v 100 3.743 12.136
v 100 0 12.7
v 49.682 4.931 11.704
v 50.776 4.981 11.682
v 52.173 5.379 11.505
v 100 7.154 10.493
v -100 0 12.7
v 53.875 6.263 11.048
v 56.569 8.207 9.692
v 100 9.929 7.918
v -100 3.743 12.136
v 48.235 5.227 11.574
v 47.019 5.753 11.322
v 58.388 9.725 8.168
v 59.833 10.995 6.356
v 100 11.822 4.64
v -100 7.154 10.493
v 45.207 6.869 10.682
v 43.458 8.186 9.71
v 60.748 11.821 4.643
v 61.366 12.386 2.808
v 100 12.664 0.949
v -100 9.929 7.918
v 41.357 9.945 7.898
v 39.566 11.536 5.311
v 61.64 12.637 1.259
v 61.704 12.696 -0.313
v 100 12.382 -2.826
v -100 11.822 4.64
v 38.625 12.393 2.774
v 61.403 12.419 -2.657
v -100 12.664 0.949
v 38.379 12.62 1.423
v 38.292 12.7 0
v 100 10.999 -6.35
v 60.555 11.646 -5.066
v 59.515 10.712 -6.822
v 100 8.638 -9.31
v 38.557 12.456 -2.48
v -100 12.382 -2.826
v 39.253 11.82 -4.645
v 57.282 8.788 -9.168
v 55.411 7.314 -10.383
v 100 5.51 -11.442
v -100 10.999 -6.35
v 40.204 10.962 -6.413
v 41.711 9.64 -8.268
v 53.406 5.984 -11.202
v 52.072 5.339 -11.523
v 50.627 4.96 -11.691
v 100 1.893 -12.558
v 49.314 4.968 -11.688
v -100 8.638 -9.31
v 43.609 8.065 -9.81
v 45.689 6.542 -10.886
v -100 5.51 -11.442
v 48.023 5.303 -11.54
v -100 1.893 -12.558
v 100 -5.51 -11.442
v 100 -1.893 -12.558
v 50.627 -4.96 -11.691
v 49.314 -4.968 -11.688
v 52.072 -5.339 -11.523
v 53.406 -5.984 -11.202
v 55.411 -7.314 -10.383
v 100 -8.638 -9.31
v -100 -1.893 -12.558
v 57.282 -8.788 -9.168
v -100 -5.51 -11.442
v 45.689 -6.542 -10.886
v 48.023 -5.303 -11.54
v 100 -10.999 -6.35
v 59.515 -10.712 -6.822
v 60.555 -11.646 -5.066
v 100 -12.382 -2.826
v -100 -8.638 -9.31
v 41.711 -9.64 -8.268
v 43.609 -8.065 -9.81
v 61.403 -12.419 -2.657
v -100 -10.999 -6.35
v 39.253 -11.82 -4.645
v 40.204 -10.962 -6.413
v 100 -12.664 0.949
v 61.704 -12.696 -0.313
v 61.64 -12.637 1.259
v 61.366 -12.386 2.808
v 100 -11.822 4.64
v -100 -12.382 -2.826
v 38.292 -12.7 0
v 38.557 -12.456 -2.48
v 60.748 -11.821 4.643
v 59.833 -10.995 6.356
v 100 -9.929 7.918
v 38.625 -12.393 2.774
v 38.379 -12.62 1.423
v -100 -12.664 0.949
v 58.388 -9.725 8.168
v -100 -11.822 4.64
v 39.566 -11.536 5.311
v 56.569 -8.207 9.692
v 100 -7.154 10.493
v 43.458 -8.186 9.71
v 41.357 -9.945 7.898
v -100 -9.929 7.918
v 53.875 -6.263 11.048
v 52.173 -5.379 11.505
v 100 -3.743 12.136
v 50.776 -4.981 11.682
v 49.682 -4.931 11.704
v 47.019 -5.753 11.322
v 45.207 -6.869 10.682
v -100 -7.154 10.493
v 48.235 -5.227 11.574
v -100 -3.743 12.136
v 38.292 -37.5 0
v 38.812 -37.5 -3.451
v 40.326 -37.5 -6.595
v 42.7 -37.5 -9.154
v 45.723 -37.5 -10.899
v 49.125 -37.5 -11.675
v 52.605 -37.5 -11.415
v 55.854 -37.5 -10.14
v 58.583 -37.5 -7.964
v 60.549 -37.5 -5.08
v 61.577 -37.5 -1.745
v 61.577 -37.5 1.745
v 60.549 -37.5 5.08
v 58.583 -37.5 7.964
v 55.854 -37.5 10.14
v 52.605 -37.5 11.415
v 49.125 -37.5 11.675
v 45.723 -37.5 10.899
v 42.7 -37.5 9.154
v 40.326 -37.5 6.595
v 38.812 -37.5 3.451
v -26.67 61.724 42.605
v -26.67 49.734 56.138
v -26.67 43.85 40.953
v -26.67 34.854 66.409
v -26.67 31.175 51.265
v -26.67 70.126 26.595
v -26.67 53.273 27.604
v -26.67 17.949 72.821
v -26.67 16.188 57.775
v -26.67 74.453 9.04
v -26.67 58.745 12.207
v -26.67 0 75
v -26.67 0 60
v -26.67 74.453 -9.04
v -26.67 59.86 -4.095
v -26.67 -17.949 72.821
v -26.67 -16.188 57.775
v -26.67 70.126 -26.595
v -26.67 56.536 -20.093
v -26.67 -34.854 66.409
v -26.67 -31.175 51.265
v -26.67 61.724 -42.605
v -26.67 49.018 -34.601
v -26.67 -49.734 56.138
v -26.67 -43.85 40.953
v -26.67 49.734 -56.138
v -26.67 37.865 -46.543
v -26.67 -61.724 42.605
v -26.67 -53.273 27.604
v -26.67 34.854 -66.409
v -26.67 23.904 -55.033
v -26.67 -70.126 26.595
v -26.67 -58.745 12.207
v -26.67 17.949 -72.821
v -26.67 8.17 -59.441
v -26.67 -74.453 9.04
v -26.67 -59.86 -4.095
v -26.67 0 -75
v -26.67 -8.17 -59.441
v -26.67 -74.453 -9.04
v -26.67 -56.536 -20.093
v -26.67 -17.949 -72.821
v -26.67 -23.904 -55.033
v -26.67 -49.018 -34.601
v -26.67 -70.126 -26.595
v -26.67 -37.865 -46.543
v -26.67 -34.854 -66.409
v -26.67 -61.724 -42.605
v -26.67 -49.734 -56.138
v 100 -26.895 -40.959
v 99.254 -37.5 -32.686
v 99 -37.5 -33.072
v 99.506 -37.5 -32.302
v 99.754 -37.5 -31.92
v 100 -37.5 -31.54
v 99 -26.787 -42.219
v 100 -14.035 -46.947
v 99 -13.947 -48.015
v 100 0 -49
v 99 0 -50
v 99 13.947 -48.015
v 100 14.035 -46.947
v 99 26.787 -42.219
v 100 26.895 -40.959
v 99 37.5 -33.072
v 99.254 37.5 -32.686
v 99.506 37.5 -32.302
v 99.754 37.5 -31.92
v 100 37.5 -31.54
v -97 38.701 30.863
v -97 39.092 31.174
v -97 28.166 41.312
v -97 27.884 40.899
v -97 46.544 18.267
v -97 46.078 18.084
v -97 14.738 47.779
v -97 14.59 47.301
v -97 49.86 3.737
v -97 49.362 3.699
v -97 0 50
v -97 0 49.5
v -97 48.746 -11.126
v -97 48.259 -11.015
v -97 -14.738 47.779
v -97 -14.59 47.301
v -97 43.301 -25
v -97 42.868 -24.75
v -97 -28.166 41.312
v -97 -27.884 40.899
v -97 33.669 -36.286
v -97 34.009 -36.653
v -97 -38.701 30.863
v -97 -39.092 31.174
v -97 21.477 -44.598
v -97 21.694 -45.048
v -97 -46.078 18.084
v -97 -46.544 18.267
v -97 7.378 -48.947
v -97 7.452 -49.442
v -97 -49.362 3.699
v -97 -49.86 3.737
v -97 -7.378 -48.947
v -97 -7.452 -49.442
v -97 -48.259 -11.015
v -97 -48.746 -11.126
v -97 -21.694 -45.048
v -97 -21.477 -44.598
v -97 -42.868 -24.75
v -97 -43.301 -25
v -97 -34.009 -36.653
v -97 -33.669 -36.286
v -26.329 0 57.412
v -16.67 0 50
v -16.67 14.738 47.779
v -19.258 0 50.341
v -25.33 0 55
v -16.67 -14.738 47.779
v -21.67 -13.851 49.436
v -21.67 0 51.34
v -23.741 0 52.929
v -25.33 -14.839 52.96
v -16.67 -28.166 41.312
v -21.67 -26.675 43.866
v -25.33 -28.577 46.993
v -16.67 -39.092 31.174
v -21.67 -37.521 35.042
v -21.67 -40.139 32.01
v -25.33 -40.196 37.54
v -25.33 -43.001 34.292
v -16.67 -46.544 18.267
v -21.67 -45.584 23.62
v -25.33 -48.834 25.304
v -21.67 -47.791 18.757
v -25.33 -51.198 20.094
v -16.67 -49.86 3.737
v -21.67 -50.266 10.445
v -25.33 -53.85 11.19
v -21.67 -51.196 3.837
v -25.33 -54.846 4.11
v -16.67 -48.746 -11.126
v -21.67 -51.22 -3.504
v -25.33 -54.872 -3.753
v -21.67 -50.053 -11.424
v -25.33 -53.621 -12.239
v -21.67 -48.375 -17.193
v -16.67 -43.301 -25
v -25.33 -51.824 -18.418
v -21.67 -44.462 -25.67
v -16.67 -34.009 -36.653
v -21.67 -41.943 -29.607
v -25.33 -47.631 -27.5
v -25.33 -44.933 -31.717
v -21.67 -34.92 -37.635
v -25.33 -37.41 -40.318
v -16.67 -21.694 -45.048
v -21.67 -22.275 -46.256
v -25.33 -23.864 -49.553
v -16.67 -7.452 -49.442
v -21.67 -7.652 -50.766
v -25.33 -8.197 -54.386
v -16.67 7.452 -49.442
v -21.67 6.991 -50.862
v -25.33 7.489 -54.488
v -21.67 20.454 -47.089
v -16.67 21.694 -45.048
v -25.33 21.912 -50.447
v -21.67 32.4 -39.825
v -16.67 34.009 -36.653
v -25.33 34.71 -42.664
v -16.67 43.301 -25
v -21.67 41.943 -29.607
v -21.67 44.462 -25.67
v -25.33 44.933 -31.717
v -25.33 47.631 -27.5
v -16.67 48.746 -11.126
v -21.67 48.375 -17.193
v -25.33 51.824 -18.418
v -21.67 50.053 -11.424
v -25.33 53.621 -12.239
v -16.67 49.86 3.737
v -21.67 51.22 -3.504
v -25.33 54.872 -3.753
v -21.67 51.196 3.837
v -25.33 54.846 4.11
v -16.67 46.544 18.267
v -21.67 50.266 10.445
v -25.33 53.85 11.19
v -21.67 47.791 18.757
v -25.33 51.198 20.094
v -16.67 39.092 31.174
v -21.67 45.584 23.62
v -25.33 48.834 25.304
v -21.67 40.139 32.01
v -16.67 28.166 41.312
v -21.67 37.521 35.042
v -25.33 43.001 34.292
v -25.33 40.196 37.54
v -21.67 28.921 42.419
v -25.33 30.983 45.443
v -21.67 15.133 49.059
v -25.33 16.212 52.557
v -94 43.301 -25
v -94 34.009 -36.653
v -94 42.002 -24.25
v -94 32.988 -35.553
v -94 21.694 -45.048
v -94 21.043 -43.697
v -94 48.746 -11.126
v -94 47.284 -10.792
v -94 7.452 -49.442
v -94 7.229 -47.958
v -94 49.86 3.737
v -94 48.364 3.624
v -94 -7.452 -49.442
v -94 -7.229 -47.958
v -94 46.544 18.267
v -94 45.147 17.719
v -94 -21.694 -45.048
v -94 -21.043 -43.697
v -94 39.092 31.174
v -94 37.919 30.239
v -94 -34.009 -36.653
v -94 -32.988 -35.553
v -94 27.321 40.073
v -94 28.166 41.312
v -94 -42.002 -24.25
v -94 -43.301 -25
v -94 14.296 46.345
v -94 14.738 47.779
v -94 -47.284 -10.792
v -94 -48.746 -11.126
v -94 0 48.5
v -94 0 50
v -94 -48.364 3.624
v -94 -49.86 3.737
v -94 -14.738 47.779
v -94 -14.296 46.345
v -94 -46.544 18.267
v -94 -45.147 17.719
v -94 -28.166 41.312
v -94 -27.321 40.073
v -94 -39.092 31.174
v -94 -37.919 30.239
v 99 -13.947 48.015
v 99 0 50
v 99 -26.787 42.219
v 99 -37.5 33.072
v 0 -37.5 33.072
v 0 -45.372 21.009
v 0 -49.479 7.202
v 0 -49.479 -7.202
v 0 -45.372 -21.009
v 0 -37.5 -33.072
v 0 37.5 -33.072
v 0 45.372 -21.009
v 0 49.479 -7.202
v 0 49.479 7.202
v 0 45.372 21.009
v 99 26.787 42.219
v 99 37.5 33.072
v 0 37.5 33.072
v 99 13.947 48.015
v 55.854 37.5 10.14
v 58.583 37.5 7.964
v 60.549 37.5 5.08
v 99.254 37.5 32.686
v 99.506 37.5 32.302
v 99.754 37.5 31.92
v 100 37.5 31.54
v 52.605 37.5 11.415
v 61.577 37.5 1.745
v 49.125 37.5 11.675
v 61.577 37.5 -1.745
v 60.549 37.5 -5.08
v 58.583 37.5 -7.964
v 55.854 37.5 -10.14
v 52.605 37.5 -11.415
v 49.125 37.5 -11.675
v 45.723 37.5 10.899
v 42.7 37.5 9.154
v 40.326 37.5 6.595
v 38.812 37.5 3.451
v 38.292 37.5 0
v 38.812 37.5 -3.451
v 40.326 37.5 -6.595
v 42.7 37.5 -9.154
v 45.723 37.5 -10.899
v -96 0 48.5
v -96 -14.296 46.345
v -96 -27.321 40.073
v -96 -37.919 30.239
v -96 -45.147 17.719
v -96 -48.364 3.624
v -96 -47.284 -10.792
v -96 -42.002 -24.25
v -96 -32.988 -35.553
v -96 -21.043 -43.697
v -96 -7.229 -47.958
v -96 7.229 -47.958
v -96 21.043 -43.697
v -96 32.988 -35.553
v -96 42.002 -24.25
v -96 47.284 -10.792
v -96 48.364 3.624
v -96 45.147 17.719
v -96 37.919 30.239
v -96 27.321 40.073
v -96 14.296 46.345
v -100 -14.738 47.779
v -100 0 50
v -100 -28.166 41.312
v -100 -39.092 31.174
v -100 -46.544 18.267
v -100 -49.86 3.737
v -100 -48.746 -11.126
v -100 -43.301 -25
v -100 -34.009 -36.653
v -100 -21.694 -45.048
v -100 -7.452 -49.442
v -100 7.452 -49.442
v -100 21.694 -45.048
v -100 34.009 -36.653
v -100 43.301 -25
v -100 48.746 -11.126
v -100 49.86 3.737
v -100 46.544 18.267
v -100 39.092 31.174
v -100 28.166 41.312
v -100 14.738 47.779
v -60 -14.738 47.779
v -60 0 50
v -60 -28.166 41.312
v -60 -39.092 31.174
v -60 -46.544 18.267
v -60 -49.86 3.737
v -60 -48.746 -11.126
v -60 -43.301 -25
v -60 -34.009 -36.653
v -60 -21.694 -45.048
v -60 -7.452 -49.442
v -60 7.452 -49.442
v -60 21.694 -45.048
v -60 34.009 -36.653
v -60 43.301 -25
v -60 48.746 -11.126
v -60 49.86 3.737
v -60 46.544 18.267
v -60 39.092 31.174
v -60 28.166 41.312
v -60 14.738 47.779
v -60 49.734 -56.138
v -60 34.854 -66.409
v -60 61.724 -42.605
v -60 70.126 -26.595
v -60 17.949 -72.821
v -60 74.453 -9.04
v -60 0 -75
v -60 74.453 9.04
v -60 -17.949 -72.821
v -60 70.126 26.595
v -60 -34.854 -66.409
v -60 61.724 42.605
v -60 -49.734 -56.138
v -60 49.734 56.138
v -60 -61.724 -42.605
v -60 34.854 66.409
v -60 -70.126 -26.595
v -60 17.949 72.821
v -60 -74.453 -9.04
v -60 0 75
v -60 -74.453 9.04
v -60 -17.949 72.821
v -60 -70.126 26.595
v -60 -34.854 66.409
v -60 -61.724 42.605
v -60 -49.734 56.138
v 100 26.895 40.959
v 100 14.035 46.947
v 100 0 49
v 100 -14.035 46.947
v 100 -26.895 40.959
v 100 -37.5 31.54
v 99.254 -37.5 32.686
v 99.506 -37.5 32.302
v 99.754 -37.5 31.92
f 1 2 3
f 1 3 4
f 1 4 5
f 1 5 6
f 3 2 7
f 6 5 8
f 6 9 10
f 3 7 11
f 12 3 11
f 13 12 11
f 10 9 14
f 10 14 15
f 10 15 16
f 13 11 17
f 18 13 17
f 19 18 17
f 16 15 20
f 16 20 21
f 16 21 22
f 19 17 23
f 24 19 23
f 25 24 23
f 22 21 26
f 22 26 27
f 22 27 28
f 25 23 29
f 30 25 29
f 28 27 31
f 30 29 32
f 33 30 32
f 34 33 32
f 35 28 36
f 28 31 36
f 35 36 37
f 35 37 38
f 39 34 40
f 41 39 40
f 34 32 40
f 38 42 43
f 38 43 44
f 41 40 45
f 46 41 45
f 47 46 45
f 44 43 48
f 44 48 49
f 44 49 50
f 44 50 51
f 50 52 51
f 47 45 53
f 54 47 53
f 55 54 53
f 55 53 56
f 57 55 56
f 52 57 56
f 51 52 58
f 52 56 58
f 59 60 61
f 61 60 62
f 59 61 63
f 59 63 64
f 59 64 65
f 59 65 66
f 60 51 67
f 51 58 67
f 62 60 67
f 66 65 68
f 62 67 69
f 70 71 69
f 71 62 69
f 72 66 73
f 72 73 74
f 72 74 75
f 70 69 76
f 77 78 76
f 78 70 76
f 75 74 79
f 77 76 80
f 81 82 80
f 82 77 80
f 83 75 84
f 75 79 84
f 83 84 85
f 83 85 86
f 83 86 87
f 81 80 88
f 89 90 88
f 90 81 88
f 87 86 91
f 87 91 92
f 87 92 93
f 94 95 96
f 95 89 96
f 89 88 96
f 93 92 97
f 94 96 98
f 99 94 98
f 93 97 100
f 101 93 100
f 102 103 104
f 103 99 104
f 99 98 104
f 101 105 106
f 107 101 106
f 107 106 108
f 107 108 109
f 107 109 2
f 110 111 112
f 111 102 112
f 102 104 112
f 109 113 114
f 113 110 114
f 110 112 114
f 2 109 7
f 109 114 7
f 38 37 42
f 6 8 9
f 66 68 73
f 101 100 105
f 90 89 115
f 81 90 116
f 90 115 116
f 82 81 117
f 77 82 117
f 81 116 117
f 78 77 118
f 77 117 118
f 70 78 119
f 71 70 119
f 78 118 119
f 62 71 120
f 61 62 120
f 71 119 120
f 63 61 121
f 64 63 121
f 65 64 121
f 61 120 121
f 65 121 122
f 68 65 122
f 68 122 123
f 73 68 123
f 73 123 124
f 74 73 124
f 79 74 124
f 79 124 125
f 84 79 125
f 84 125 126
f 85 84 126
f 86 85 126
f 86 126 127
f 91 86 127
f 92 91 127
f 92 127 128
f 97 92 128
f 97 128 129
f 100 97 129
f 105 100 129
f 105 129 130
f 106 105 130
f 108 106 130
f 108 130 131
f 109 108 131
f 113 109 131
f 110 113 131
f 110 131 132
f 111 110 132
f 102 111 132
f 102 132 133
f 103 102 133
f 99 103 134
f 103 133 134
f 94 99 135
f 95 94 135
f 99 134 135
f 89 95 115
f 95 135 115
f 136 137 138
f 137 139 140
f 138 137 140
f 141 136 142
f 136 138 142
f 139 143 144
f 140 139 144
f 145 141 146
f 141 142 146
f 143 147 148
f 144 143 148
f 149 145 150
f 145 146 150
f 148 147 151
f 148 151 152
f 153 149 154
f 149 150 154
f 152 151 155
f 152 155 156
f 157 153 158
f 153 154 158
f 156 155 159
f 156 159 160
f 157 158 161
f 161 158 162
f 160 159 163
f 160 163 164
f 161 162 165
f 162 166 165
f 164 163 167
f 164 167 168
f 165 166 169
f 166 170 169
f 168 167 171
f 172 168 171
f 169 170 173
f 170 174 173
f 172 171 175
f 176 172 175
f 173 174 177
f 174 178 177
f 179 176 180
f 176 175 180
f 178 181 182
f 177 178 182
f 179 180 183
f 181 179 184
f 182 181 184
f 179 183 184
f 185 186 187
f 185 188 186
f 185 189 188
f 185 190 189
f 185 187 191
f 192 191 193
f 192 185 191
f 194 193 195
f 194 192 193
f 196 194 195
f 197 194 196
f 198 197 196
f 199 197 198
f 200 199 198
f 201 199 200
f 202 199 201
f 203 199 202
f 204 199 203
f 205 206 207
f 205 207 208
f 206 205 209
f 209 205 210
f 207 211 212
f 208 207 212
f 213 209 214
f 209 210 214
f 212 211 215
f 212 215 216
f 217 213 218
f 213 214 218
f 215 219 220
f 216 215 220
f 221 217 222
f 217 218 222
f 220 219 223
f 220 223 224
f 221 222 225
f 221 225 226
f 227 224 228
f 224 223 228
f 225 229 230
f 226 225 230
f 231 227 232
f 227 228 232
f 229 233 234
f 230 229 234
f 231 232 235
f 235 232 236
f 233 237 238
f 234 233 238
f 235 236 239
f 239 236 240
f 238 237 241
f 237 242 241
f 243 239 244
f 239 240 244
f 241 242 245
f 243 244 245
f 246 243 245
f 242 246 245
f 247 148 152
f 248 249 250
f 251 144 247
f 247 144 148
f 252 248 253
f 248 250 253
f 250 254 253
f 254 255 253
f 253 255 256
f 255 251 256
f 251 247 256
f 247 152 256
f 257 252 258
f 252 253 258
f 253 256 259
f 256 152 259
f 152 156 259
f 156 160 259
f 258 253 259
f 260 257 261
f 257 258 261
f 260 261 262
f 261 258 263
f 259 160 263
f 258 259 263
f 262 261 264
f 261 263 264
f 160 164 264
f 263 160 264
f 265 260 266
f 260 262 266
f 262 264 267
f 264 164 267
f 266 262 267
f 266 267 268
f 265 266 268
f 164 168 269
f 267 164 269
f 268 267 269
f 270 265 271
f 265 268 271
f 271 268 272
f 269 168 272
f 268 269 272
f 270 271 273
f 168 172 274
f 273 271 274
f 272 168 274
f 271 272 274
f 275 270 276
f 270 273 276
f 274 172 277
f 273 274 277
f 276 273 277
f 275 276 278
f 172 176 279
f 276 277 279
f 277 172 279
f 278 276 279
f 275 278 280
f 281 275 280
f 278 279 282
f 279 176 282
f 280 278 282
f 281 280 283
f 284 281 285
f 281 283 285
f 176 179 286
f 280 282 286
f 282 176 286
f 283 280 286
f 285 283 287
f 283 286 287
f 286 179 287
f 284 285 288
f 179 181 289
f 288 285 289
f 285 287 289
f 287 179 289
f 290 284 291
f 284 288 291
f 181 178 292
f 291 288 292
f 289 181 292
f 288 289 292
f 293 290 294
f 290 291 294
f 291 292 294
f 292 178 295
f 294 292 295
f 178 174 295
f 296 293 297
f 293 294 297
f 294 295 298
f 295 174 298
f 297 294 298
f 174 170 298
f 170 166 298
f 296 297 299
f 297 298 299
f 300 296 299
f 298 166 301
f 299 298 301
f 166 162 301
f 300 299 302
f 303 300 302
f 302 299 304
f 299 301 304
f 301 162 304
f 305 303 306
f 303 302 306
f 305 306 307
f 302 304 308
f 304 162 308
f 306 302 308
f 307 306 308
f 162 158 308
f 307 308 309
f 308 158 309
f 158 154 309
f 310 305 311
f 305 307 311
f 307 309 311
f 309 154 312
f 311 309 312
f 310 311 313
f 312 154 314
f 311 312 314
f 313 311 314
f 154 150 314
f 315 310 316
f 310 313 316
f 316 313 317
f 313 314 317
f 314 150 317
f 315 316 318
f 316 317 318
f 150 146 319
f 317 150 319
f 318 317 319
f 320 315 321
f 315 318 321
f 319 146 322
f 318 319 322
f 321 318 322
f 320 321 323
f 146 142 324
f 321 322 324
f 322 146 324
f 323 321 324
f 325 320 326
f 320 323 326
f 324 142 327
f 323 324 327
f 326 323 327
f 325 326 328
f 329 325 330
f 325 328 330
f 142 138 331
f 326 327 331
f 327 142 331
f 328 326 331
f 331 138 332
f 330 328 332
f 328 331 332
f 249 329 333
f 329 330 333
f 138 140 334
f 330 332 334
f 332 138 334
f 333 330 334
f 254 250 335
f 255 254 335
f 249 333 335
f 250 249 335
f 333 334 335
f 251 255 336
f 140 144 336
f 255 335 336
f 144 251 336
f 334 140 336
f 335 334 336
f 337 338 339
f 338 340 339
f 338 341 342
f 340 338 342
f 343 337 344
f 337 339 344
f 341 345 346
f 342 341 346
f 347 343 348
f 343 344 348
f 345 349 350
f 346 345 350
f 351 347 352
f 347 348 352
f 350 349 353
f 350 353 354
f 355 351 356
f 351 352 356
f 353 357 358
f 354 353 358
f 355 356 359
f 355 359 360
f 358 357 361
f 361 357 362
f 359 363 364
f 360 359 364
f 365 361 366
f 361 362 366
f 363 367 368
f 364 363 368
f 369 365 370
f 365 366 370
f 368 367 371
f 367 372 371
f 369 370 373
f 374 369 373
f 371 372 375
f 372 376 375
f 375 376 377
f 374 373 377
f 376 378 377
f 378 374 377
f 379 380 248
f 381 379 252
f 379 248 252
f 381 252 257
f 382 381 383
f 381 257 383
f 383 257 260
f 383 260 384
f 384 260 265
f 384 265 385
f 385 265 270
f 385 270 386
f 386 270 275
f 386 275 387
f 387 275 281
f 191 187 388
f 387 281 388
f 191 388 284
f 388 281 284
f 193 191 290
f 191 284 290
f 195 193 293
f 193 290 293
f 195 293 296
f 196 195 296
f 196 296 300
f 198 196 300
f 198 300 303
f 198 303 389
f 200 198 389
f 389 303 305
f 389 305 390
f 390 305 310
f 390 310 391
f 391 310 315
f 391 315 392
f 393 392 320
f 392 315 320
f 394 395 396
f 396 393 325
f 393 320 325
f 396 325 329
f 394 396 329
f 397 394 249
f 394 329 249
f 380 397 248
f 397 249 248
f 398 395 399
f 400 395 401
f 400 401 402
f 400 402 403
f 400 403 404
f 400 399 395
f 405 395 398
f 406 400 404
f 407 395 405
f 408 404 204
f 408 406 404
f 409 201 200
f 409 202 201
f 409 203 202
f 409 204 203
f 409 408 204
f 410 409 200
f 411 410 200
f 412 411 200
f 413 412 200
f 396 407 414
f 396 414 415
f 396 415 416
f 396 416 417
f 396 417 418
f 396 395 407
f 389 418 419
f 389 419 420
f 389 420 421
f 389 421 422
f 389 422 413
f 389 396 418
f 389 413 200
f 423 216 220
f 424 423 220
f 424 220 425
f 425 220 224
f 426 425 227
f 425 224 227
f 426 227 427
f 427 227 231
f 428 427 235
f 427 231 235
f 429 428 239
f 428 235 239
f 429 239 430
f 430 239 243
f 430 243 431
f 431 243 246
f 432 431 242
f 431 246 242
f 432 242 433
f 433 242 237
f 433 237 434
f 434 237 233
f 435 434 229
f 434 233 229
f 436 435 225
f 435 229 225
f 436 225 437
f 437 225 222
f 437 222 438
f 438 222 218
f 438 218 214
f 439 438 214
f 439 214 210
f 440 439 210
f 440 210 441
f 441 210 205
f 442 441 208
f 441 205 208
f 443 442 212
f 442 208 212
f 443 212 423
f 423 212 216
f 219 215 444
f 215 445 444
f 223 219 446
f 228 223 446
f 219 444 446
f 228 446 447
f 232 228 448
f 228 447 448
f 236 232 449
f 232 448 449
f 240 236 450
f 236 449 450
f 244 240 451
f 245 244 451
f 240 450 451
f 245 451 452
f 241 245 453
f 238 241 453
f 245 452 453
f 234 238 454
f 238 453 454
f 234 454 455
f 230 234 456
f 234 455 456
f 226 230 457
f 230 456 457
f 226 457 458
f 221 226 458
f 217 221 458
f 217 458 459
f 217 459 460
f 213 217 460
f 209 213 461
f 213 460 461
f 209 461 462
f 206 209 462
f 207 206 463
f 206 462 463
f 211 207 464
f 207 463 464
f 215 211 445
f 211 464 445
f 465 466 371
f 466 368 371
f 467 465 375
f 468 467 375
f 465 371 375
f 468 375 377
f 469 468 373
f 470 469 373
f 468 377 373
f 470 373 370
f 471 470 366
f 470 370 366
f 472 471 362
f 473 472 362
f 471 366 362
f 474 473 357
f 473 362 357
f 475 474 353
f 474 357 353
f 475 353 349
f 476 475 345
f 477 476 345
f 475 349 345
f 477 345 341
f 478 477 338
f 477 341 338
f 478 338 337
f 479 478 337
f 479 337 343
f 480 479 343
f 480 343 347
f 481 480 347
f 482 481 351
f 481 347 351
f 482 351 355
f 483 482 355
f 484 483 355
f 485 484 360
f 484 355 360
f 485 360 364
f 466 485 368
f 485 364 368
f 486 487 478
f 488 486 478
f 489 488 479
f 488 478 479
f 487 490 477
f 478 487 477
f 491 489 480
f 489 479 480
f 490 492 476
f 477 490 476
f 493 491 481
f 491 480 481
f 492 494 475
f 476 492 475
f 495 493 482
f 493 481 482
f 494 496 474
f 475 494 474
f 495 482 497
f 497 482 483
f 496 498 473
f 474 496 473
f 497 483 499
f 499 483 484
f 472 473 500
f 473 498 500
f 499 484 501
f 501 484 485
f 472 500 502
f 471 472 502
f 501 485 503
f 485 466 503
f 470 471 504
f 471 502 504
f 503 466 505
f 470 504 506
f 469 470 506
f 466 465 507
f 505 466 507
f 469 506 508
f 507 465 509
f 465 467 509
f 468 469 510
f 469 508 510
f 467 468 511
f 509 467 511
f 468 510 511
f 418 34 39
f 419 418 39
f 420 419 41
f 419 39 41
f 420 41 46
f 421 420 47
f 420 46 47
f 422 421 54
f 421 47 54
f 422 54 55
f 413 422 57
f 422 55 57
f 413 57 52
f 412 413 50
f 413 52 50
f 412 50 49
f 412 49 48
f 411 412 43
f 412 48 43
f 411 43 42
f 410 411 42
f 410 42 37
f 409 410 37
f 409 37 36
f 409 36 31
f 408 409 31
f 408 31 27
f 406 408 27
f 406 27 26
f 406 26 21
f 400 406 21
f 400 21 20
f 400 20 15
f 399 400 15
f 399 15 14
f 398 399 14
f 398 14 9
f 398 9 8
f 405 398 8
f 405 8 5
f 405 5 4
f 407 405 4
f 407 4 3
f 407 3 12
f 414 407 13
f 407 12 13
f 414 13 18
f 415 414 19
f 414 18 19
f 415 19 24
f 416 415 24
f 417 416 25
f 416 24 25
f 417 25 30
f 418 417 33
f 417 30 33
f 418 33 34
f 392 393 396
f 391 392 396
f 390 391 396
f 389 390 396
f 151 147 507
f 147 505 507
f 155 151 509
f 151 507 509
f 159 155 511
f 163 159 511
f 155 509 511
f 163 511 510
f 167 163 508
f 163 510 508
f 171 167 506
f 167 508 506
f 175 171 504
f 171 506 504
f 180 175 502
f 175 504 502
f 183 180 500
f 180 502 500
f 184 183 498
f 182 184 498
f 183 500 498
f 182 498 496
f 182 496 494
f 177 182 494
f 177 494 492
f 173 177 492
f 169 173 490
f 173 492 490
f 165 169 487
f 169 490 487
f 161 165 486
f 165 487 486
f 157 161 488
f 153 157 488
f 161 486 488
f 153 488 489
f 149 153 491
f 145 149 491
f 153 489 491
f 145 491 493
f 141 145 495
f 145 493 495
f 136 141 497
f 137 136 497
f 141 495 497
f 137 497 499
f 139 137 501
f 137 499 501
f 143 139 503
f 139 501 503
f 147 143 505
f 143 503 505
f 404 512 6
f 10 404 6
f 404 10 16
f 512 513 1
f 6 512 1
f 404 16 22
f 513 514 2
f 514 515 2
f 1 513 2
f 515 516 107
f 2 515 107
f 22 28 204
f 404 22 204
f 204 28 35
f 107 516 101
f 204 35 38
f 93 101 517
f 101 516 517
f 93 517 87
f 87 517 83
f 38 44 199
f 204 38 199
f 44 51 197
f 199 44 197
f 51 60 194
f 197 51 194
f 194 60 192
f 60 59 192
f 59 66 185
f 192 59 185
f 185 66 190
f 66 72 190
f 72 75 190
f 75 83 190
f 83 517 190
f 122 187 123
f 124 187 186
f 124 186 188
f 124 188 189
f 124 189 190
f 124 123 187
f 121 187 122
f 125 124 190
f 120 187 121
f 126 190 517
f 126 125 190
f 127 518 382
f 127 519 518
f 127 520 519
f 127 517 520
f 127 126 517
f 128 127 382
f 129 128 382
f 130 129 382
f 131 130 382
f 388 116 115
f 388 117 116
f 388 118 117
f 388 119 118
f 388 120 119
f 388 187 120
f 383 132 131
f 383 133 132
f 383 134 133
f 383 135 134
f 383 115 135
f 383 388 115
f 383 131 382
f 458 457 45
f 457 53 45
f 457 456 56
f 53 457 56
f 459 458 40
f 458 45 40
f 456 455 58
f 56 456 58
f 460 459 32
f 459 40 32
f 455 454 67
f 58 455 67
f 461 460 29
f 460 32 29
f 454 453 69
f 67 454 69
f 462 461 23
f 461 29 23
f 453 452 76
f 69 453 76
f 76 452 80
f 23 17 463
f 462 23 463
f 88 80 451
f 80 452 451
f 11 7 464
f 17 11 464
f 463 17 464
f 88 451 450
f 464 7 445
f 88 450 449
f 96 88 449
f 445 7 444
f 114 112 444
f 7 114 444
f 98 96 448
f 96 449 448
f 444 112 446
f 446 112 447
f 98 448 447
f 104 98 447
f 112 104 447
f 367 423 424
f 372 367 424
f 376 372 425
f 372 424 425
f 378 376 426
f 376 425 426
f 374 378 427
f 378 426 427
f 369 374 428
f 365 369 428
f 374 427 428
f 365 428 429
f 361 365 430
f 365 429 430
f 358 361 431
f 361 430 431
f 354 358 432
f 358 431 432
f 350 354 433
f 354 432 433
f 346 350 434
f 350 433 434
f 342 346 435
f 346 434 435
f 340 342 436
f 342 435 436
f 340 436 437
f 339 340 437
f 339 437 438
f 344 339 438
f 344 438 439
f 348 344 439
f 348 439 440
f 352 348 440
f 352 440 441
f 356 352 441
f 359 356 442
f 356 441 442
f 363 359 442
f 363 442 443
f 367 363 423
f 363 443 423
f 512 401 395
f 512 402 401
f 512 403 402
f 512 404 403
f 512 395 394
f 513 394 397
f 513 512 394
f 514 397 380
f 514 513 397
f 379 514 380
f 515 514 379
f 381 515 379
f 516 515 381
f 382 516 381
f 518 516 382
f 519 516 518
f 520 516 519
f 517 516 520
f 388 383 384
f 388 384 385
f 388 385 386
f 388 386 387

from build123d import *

# Parameters (mm, degrees)
CUT_EXTRUDE1_START     = -100
CUT_EXTRUDE1_DEPTH     = 100
F_1_12_TAPPED_HOLE1_D  = 23.41626
F_1_1_DIAMETER_HOLE1_D = 25.4
CHAMFER1_SIZE          = 1


with BuildPart() as part:
    # Sketch2 one side → Revolve1 (revolve)
    with BuildSketch(Plane.XY, mode=Mode.PRIVATE) as revolve1_sk:
        with BuildLine():
            Line((-94, 50), (-94, 48.5))
            Line((-94, 48.5), (-97, 48.5))
            Line((-97, 48.5), (-97, 50))
            Line((-97, 50), (-100, 50))
            Line((-100, 50), (-100, 0))
            Line((-100, 0), (100, 0))
            Line((100, 0), (100, 50))
            Line((100, 50), (-16.67, 50))
            ThreePointArc((-16.67, 50), (-23.741067812, 52.928932188), (-26.67, 60))
            Line((-26.67, 60), (-26.67, 75))
            Line((-26.67, 75), (-60, 75))
            Line((-60, 75), (-60, 50))
            Line((-60, 50), (-94, 50))
        make_face()
    revolve(revolve1_sk.sketch.rotate(Axis((-100, 0, 0), (1, 0, 0)), 90), axis=Axis((-100, 0, 0), (1, 0, 0)))

    # Sketch3 → Cut-Extrude1 (cut)
    with BuildSketch(Plane(origin=(100, 0, 0), x_dir=(0, 0, -1), z_dir=(1, 0, 0)).offset(CUT_EXTRUDE1_START)):
        with BuildLine():
            ThreePointArc((33.071891388, 37.5), (0, 50), (-33.071891388, 37.5))
            Line((-33.071891388, 37.5), (33.071891388, 37.5))
        make_face()
        with BuildLine():
            Line((33.071891388, -37.5), (-33.071891388, -37.5))
            ThreePointArc((-33.071891388, -37.5), (0, -50), (33.071891388, -37.5))
        make_face()
    extrude(amount=CUT_EXTRUDE1_DEPTH, mode=Mode.SUBTRACT)

    # 1-12 Tapped Hole1 (through all)
    with Locations(Plane(origin=(0, 37.5, 0), x_dir=(1, 0, 0), z_dir=(0, 1, 0))):
        with Locations((50, 0)):
            Hole(F_1_12_TAPPED_HOLE1_D / 2)

    # 1 (1) Diameter Hole1 (through all)
    with Locations(Plane(origin=(100, 0, 0), x_dir=(0, 0, -1), z_dir=(1, 0, 0))):
        with Locations((0, 0)):
            Hole(F_1_1_DIAMETER_HOLE1_D / 2)

    # Chamfer1
    chamfer1_edges = [part.edges().sort_by_distance(p)[0] for p in [
        (-97, 0, -48.5),
        (100, 0, -50),
        (100, 20.571891388, 45.571891388),
    ]]
    chamfer(chamfer1_edges, length=CHAMFER1_SIZE)


solid = part.part
